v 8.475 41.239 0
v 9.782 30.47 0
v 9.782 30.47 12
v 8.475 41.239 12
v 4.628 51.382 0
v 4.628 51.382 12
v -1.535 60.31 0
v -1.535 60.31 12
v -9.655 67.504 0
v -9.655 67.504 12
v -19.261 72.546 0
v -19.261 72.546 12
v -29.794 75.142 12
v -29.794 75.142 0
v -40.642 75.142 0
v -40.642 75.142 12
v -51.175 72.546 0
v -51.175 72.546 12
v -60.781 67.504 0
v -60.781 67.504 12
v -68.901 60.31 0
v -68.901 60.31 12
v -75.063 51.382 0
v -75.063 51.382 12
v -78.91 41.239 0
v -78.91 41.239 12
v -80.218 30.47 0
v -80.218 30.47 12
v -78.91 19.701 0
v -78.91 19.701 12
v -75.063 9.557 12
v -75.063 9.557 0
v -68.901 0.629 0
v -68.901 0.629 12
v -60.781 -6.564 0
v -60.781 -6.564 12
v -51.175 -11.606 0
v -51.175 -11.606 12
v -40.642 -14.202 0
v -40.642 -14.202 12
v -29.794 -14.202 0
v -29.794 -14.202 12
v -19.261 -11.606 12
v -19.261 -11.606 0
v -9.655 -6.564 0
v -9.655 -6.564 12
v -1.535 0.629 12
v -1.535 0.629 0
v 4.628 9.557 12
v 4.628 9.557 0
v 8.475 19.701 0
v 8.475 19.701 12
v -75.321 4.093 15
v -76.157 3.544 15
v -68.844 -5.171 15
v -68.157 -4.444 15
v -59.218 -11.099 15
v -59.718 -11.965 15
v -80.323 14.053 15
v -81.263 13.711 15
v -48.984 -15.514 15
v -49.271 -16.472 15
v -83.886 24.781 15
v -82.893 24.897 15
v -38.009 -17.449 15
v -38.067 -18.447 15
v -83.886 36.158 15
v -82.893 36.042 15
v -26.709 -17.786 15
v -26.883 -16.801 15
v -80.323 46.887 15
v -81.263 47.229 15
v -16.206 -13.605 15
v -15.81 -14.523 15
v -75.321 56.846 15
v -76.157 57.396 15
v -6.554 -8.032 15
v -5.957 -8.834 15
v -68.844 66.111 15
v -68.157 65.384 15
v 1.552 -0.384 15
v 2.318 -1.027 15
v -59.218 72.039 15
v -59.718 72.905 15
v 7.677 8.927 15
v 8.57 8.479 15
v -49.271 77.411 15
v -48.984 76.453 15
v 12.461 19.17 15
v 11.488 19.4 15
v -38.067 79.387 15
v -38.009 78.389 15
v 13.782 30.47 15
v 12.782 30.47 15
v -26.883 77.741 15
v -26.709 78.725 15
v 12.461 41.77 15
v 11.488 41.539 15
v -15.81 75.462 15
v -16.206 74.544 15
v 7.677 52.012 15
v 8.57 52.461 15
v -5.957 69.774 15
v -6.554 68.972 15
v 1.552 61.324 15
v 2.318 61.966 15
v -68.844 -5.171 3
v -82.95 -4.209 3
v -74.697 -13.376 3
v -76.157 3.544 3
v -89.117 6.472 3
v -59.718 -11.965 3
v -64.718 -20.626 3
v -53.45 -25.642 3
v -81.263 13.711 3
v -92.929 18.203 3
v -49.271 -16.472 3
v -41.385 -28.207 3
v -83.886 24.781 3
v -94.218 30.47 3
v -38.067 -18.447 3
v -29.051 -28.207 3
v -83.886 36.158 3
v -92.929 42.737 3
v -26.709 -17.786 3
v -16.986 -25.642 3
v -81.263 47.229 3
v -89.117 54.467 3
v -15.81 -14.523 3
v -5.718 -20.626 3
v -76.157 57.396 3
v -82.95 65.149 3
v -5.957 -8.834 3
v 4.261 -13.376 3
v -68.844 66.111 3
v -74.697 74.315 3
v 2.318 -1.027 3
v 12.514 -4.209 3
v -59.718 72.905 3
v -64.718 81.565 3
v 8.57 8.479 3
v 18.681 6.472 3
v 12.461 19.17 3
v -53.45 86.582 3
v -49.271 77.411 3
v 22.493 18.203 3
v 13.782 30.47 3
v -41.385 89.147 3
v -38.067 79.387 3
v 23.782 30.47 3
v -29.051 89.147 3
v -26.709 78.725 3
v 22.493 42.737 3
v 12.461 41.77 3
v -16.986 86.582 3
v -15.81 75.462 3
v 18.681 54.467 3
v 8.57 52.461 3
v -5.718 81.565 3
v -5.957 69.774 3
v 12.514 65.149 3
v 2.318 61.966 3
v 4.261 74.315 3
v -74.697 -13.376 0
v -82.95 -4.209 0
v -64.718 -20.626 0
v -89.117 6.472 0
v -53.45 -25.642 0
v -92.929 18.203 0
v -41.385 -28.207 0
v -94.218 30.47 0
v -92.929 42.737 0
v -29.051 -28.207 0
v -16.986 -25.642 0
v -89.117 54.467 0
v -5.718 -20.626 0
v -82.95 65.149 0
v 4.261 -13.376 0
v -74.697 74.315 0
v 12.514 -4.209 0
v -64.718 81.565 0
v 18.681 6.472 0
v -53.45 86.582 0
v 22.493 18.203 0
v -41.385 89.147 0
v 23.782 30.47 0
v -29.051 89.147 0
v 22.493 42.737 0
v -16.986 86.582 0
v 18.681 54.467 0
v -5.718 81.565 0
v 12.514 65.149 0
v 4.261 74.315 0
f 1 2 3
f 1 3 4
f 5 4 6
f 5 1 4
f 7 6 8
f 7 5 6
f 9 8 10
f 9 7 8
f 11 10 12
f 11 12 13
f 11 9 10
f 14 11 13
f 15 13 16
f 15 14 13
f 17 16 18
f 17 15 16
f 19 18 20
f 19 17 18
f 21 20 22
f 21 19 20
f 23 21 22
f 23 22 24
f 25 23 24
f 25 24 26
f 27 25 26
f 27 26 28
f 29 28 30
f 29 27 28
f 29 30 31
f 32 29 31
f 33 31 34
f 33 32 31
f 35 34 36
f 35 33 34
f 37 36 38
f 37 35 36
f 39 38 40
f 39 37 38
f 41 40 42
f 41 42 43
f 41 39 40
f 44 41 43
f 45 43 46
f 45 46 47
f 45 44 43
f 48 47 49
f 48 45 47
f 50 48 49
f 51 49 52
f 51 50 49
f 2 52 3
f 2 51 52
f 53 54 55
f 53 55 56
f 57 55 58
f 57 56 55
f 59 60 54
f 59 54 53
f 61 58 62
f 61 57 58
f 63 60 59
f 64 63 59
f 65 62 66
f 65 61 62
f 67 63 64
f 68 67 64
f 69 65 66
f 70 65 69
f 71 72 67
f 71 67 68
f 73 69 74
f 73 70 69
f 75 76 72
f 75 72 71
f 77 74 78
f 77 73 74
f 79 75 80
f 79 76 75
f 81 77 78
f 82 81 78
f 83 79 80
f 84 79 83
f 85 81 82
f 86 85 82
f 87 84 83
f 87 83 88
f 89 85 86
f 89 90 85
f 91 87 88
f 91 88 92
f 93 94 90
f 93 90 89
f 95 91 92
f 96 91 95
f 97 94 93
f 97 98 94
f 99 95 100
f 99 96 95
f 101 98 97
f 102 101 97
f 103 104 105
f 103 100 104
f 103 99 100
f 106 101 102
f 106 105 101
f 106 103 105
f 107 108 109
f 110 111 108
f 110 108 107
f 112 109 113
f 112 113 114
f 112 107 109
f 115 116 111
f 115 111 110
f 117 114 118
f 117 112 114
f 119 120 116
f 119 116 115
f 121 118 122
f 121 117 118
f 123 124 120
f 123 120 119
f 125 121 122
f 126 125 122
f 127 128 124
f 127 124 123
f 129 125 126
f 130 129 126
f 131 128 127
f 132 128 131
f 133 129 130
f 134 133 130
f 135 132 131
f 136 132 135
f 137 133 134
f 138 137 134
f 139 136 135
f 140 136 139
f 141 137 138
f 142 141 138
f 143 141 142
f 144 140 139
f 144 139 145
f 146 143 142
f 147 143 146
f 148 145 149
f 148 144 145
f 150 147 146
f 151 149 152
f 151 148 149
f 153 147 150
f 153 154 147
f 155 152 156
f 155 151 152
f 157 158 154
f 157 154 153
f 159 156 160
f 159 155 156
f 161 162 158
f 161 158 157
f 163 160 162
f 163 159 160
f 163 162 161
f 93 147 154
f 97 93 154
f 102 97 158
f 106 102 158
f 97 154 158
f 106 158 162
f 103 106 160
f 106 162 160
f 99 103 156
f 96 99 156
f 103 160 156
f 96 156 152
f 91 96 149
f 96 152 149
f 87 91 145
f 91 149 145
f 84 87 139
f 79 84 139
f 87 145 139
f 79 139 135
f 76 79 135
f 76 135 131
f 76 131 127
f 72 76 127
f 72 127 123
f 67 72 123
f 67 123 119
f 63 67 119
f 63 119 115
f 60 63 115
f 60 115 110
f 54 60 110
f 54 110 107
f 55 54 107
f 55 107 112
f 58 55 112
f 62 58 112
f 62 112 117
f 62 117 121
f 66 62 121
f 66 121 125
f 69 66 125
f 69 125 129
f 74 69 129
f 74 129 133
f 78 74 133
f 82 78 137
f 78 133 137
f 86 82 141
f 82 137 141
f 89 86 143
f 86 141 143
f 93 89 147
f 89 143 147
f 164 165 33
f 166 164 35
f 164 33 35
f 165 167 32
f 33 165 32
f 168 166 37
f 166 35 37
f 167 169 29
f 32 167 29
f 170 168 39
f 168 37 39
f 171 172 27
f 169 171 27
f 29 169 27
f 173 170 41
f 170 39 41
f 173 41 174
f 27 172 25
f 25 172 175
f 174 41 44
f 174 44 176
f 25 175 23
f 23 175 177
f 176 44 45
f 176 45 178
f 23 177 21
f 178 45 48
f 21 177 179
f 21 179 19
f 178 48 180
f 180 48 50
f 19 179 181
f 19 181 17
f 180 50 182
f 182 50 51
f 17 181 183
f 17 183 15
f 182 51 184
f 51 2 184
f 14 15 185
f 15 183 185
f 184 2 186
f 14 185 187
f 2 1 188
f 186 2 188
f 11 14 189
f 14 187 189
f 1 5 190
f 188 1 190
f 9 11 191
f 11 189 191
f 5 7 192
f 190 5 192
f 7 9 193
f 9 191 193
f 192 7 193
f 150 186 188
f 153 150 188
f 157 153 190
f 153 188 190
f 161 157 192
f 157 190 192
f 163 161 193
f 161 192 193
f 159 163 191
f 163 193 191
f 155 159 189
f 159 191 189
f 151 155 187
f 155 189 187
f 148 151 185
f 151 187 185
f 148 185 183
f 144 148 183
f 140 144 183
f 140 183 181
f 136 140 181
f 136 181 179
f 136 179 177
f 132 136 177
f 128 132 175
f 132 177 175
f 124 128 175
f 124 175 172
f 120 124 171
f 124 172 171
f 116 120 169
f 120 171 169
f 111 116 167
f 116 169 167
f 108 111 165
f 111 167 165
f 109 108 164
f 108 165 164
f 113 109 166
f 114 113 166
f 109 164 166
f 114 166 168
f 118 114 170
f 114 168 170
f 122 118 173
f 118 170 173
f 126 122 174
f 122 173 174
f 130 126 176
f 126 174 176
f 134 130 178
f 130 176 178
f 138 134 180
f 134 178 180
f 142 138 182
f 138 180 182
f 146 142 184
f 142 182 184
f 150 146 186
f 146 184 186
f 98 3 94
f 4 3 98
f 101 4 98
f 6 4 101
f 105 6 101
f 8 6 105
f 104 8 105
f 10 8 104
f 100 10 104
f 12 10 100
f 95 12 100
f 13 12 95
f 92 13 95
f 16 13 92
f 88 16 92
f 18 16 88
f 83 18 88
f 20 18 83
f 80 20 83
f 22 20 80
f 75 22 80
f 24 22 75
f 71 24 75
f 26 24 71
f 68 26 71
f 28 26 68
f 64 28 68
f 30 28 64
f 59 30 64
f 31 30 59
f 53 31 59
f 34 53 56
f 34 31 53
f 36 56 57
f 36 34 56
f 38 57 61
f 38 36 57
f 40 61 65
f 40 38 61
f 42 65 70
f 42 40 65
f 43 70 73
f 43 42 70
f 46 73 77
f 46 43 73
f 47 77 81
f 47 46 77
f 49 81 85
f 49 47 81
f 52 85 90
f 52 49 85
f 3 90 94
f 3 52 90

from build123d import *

# Parameters (mm, degrees)
F0_R     = 59
F0_R_2   = 49
F1_DEPTH = 3
F0_R_3   = 45
F2_DEPTH = 15
F3_SIZE  = 3


with BuildPart() as f1:
    # F0 (on Top) → F1 (new body)
    with BuildSketch(Plane.XY):
        with Locations((-35.217796, 30.469857)):
            Circle(F0_R)
        with Locations((-35.217796, 30.469857)):
            Circle(F0_R_2, mode=Mode.SUBTRACT)
    extrude(amount=F1_DEPTH)

    # F0 (on Top) → F2 (join)
    with BuildSketch(Plane.XY):
        with Locations((-35.217796, 30.469857)):
            Circle(F0_R_2)
        with Locations((-35.217796, 30.469857)):
            Circle(F0_R_3, mode=Mode.SUBTRACT)
    extrude(amount=F2_DEPTH)

    # F3
    f3_edges = [f1.edges().sort_by_distance(p)[0] for p in [
        (-80.217796, 30.469857, 15),
    ]]
    chamfer(f3_edges, length=F3_SIZE)


solid = f1.part
